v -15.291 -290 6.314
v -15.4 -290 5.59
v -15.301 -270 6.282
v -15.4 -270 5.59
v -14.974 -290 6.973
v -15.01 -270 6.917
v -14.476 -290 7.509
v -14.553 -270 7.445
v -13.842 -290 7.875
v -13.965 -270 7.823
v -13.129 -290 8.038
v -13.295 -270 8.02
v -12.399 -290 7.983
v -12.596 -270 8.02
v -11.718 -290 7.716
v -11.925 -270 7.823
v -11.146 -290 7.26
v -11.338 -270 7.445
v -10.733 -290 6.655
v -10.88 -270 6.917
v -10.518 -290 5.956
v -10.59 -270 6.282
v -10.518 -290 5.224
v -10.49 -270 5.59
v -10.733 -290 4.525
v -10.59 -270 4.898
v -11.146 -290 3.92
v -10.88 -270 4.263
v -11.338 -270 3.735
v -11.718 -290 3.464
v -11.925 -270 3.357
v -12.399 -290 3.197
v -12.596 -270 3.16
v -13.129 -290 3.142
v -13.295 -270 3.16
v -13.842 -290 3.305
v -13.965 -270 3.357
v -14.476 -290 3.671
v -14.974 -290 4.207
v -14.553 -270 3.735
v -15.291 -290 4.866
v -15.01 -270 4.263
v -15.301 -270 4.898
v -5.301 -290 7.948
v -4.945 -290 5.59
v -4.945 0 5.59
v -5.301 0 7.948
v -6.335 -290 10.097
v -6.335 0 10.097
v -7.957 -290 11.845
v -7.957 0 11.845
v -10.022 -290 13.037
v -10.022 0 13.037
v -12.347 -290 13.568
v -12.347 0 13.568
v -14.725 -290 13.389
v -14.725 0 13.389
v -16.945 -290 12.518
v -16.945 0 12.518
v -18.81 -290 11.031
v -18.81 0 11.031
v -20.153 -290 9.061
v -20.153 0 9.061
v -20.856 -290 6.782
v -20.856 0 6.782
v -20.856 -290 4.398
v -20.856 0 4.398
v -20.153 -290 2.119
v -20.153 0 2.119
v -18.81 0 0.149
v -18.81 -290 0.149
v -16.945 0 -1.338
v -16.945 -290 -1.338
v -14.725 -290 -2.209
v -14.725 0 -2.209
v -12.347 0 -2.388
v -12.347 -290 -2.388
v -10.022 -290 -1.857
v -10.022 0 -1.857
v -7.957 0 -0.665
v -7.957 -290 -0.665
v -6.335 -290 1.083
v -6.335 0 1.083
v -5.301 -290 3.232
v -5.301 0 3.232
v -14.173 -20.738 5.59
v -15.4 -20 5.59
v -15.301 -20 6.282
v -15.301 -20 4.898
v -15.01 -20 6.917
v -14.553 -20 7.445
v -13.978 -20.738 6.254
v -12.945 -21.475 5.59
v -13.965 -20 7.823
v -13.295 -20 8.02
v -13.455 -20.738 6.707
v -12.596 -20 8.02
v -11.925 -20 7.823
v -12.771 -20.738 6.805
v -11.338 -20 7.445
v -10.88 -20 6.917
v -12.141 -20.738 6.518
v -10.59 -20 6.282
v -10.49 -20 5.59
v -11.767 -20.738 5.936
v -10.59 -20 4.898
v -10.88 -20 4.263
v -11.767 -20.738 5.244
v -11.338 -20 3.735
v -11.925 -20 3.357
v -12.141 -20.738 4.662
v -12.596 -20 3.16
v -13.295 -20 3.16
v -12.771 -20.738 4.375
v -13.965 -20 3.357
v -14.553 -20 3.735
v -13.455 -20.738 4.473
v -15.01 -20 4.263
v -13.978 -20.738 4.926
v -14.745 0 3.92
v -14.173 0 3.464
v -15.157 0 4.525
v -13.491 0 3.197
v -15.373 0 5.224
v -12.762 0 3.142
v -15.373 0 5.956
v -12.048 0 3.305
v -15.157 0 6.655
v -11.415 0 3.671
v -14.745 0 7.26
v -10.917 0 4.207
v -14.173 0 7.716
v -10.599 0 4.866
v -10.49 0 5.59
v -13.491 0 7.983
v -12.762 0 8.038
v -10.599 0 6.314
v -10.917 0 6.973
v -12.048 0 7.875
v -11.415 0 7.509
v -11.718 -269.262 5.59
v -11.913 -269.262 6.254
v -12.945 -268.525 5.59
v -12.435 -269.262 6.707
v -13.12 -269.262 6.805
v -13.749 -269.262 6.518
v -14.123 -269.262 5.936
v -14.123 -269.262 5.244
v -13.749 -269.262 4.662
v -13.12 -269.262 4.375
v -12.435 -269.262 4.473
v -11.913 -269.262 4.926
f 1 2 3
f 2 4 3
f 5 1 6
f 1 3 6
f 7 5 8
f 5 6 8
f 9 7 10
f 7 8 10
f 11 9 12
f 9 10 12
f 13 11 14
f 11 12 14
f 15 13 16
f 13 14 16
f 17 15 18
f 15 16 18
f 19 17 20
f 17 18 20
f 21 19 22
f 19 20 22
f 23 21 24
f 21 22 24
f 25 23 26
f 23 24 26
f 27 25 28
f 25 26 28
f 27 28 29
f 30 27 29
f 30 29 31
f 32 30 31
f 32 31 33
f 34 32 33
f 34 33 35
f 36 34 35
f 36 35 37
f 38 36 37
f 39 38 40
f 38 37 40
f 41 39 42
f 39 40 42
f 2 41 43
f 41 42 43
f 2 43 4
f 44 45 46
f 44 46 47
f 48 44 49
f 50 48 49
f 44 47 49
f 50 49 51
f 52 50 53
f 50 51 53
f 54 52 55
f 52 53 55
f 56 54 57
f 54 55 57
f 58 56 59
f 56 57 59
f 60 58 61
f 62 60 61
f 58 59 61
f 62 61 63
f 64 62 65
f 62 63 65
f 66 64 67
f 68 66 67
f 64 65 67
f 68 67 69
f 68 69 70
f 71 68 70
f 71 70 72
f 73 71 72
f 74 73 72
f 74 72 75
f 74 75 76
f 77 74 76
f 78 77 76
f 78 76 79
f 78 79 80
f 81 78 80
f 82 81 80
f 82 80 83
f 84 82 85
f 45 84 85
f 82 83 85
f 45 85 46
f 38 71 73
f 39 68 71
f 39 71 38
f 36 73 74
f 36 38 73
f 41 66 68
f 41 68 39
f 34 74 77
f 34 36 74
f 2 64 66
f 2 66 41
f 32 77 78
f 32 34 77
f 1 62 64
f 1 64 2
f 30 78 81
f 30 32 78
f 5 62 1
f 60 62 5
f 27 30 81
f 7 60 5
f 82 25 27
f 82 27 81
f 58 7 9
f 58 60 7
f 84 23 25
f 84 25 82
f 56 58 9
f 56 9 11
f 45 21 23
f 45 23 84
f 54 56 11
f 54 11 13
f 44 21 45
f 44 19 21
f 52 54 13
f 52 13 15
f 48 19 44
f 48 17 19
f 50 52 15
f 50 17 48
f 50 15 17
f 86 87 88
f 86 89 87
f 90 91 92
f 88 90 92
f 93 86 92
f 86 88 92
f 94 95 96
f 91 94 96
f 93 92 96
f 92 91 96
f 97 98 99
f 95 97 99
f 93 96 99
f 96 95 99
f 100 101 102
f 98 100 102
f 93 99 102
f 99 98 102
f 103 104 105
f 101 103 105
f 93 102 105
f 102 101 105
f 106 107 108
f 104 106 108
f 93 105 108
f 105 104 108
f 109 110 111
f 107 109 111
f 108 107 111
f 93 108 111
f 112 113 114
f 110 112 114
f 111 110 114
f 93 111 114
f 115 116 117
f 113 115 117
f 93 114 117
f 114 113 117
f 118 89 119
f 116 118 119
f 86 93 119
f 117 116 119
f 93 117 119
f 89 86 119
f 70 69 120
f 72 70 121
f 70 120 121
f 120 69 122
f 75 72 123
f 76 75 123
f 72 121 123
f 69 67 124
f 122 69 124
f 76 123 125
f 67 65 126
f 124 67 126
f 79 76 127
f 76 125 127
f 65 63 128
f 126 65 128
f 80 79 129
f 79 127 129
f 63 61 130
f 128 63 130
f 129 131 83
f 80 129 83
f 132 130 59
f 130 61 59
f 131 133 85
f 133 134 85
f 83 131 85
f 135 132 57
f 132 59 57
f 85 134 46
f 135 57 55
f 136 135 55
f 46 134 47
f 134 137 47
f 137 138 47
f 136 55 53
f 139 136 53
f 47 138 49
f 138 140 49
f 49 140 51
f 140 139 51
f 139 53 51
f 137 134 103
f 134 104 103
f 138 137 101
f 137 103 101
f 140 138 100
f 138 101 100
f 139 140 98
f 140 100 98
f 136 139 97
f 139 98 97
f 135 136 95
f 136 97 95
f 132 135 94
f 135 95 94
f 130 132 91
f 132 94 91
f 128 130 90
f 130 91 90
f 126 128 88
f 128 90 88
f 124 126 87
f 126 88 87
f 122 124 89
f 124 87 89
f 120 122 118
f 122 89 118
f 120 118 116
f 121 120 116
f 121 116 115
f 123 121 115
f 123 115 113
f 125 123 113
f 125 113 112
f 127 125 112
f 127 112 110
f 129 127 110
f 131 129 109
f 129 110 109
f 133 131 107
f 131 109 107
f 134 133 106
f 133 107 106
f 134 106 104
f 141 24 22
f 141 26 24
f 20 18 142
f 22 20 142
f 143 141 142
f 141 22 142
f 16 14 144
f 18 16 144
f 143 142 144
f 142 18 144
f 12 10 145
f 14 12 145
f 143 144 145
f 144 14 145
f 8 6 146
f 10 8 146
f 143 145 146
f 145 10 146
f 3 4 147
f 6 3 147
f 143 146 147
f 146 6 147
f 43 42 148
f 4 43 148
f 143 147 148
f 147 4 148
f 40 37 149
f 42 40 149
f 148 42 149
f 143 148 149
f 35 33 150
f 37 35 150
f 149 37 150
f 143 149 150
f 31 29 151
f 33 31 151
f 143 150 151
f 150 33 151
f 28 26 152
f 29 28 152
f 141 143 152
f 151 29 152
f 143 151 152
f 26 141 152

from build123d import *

# Parameters (mm, degrees)
F0_R     = 8
F1_DEPTH = 290
F3_D     = 4.91
F3_DEPTH = 20
F3_TIP   = 1.4751128197
F5_D     = 4.91
F5_DEPTH = 20
F5_TIP   = 1.4751128197


with BuildPart() as f1:
    # F0 (on Front) → F1 (new body)
    with BuildSketch(Plane.XZ):
        with Locations((-12.9452068359, 5.5899755098)):
            Circle(F0_R)
    extrude(amount=F1_DEPTH)

    # F3
    with Locations(Plane.XZ.offset(290)):
        with Locations((-12.9452068359, 5.5899755098)):
            Hole(F3_D / 2, depth=F3_DEPTH)
            with Locations((0, 0, -(F3_DEPTH + F3_TIP / 2))):  # 118° drill point
                Cone(0, F3_D / 2, F3_TIP, mode=Mode.SUBTRACT)

    # F5
    with Locations(Plane(origin=(0, 0, 0), x_dir=(-1, 0, 0), z_dir=(0, 1, 0))):
        with Locations((12.9452068359, 5.5899755098)):
            Hole(F5_D / 2, depth=F5_DEPTH)
            with Locations((0, 0, -(F5_DEPTH + F5_TIP / 2))):  # 118° drill point
                Cone(0, F5_D / 2, F5_TIP, mode=Mode.SUBTRACT)


solid = f1.part
